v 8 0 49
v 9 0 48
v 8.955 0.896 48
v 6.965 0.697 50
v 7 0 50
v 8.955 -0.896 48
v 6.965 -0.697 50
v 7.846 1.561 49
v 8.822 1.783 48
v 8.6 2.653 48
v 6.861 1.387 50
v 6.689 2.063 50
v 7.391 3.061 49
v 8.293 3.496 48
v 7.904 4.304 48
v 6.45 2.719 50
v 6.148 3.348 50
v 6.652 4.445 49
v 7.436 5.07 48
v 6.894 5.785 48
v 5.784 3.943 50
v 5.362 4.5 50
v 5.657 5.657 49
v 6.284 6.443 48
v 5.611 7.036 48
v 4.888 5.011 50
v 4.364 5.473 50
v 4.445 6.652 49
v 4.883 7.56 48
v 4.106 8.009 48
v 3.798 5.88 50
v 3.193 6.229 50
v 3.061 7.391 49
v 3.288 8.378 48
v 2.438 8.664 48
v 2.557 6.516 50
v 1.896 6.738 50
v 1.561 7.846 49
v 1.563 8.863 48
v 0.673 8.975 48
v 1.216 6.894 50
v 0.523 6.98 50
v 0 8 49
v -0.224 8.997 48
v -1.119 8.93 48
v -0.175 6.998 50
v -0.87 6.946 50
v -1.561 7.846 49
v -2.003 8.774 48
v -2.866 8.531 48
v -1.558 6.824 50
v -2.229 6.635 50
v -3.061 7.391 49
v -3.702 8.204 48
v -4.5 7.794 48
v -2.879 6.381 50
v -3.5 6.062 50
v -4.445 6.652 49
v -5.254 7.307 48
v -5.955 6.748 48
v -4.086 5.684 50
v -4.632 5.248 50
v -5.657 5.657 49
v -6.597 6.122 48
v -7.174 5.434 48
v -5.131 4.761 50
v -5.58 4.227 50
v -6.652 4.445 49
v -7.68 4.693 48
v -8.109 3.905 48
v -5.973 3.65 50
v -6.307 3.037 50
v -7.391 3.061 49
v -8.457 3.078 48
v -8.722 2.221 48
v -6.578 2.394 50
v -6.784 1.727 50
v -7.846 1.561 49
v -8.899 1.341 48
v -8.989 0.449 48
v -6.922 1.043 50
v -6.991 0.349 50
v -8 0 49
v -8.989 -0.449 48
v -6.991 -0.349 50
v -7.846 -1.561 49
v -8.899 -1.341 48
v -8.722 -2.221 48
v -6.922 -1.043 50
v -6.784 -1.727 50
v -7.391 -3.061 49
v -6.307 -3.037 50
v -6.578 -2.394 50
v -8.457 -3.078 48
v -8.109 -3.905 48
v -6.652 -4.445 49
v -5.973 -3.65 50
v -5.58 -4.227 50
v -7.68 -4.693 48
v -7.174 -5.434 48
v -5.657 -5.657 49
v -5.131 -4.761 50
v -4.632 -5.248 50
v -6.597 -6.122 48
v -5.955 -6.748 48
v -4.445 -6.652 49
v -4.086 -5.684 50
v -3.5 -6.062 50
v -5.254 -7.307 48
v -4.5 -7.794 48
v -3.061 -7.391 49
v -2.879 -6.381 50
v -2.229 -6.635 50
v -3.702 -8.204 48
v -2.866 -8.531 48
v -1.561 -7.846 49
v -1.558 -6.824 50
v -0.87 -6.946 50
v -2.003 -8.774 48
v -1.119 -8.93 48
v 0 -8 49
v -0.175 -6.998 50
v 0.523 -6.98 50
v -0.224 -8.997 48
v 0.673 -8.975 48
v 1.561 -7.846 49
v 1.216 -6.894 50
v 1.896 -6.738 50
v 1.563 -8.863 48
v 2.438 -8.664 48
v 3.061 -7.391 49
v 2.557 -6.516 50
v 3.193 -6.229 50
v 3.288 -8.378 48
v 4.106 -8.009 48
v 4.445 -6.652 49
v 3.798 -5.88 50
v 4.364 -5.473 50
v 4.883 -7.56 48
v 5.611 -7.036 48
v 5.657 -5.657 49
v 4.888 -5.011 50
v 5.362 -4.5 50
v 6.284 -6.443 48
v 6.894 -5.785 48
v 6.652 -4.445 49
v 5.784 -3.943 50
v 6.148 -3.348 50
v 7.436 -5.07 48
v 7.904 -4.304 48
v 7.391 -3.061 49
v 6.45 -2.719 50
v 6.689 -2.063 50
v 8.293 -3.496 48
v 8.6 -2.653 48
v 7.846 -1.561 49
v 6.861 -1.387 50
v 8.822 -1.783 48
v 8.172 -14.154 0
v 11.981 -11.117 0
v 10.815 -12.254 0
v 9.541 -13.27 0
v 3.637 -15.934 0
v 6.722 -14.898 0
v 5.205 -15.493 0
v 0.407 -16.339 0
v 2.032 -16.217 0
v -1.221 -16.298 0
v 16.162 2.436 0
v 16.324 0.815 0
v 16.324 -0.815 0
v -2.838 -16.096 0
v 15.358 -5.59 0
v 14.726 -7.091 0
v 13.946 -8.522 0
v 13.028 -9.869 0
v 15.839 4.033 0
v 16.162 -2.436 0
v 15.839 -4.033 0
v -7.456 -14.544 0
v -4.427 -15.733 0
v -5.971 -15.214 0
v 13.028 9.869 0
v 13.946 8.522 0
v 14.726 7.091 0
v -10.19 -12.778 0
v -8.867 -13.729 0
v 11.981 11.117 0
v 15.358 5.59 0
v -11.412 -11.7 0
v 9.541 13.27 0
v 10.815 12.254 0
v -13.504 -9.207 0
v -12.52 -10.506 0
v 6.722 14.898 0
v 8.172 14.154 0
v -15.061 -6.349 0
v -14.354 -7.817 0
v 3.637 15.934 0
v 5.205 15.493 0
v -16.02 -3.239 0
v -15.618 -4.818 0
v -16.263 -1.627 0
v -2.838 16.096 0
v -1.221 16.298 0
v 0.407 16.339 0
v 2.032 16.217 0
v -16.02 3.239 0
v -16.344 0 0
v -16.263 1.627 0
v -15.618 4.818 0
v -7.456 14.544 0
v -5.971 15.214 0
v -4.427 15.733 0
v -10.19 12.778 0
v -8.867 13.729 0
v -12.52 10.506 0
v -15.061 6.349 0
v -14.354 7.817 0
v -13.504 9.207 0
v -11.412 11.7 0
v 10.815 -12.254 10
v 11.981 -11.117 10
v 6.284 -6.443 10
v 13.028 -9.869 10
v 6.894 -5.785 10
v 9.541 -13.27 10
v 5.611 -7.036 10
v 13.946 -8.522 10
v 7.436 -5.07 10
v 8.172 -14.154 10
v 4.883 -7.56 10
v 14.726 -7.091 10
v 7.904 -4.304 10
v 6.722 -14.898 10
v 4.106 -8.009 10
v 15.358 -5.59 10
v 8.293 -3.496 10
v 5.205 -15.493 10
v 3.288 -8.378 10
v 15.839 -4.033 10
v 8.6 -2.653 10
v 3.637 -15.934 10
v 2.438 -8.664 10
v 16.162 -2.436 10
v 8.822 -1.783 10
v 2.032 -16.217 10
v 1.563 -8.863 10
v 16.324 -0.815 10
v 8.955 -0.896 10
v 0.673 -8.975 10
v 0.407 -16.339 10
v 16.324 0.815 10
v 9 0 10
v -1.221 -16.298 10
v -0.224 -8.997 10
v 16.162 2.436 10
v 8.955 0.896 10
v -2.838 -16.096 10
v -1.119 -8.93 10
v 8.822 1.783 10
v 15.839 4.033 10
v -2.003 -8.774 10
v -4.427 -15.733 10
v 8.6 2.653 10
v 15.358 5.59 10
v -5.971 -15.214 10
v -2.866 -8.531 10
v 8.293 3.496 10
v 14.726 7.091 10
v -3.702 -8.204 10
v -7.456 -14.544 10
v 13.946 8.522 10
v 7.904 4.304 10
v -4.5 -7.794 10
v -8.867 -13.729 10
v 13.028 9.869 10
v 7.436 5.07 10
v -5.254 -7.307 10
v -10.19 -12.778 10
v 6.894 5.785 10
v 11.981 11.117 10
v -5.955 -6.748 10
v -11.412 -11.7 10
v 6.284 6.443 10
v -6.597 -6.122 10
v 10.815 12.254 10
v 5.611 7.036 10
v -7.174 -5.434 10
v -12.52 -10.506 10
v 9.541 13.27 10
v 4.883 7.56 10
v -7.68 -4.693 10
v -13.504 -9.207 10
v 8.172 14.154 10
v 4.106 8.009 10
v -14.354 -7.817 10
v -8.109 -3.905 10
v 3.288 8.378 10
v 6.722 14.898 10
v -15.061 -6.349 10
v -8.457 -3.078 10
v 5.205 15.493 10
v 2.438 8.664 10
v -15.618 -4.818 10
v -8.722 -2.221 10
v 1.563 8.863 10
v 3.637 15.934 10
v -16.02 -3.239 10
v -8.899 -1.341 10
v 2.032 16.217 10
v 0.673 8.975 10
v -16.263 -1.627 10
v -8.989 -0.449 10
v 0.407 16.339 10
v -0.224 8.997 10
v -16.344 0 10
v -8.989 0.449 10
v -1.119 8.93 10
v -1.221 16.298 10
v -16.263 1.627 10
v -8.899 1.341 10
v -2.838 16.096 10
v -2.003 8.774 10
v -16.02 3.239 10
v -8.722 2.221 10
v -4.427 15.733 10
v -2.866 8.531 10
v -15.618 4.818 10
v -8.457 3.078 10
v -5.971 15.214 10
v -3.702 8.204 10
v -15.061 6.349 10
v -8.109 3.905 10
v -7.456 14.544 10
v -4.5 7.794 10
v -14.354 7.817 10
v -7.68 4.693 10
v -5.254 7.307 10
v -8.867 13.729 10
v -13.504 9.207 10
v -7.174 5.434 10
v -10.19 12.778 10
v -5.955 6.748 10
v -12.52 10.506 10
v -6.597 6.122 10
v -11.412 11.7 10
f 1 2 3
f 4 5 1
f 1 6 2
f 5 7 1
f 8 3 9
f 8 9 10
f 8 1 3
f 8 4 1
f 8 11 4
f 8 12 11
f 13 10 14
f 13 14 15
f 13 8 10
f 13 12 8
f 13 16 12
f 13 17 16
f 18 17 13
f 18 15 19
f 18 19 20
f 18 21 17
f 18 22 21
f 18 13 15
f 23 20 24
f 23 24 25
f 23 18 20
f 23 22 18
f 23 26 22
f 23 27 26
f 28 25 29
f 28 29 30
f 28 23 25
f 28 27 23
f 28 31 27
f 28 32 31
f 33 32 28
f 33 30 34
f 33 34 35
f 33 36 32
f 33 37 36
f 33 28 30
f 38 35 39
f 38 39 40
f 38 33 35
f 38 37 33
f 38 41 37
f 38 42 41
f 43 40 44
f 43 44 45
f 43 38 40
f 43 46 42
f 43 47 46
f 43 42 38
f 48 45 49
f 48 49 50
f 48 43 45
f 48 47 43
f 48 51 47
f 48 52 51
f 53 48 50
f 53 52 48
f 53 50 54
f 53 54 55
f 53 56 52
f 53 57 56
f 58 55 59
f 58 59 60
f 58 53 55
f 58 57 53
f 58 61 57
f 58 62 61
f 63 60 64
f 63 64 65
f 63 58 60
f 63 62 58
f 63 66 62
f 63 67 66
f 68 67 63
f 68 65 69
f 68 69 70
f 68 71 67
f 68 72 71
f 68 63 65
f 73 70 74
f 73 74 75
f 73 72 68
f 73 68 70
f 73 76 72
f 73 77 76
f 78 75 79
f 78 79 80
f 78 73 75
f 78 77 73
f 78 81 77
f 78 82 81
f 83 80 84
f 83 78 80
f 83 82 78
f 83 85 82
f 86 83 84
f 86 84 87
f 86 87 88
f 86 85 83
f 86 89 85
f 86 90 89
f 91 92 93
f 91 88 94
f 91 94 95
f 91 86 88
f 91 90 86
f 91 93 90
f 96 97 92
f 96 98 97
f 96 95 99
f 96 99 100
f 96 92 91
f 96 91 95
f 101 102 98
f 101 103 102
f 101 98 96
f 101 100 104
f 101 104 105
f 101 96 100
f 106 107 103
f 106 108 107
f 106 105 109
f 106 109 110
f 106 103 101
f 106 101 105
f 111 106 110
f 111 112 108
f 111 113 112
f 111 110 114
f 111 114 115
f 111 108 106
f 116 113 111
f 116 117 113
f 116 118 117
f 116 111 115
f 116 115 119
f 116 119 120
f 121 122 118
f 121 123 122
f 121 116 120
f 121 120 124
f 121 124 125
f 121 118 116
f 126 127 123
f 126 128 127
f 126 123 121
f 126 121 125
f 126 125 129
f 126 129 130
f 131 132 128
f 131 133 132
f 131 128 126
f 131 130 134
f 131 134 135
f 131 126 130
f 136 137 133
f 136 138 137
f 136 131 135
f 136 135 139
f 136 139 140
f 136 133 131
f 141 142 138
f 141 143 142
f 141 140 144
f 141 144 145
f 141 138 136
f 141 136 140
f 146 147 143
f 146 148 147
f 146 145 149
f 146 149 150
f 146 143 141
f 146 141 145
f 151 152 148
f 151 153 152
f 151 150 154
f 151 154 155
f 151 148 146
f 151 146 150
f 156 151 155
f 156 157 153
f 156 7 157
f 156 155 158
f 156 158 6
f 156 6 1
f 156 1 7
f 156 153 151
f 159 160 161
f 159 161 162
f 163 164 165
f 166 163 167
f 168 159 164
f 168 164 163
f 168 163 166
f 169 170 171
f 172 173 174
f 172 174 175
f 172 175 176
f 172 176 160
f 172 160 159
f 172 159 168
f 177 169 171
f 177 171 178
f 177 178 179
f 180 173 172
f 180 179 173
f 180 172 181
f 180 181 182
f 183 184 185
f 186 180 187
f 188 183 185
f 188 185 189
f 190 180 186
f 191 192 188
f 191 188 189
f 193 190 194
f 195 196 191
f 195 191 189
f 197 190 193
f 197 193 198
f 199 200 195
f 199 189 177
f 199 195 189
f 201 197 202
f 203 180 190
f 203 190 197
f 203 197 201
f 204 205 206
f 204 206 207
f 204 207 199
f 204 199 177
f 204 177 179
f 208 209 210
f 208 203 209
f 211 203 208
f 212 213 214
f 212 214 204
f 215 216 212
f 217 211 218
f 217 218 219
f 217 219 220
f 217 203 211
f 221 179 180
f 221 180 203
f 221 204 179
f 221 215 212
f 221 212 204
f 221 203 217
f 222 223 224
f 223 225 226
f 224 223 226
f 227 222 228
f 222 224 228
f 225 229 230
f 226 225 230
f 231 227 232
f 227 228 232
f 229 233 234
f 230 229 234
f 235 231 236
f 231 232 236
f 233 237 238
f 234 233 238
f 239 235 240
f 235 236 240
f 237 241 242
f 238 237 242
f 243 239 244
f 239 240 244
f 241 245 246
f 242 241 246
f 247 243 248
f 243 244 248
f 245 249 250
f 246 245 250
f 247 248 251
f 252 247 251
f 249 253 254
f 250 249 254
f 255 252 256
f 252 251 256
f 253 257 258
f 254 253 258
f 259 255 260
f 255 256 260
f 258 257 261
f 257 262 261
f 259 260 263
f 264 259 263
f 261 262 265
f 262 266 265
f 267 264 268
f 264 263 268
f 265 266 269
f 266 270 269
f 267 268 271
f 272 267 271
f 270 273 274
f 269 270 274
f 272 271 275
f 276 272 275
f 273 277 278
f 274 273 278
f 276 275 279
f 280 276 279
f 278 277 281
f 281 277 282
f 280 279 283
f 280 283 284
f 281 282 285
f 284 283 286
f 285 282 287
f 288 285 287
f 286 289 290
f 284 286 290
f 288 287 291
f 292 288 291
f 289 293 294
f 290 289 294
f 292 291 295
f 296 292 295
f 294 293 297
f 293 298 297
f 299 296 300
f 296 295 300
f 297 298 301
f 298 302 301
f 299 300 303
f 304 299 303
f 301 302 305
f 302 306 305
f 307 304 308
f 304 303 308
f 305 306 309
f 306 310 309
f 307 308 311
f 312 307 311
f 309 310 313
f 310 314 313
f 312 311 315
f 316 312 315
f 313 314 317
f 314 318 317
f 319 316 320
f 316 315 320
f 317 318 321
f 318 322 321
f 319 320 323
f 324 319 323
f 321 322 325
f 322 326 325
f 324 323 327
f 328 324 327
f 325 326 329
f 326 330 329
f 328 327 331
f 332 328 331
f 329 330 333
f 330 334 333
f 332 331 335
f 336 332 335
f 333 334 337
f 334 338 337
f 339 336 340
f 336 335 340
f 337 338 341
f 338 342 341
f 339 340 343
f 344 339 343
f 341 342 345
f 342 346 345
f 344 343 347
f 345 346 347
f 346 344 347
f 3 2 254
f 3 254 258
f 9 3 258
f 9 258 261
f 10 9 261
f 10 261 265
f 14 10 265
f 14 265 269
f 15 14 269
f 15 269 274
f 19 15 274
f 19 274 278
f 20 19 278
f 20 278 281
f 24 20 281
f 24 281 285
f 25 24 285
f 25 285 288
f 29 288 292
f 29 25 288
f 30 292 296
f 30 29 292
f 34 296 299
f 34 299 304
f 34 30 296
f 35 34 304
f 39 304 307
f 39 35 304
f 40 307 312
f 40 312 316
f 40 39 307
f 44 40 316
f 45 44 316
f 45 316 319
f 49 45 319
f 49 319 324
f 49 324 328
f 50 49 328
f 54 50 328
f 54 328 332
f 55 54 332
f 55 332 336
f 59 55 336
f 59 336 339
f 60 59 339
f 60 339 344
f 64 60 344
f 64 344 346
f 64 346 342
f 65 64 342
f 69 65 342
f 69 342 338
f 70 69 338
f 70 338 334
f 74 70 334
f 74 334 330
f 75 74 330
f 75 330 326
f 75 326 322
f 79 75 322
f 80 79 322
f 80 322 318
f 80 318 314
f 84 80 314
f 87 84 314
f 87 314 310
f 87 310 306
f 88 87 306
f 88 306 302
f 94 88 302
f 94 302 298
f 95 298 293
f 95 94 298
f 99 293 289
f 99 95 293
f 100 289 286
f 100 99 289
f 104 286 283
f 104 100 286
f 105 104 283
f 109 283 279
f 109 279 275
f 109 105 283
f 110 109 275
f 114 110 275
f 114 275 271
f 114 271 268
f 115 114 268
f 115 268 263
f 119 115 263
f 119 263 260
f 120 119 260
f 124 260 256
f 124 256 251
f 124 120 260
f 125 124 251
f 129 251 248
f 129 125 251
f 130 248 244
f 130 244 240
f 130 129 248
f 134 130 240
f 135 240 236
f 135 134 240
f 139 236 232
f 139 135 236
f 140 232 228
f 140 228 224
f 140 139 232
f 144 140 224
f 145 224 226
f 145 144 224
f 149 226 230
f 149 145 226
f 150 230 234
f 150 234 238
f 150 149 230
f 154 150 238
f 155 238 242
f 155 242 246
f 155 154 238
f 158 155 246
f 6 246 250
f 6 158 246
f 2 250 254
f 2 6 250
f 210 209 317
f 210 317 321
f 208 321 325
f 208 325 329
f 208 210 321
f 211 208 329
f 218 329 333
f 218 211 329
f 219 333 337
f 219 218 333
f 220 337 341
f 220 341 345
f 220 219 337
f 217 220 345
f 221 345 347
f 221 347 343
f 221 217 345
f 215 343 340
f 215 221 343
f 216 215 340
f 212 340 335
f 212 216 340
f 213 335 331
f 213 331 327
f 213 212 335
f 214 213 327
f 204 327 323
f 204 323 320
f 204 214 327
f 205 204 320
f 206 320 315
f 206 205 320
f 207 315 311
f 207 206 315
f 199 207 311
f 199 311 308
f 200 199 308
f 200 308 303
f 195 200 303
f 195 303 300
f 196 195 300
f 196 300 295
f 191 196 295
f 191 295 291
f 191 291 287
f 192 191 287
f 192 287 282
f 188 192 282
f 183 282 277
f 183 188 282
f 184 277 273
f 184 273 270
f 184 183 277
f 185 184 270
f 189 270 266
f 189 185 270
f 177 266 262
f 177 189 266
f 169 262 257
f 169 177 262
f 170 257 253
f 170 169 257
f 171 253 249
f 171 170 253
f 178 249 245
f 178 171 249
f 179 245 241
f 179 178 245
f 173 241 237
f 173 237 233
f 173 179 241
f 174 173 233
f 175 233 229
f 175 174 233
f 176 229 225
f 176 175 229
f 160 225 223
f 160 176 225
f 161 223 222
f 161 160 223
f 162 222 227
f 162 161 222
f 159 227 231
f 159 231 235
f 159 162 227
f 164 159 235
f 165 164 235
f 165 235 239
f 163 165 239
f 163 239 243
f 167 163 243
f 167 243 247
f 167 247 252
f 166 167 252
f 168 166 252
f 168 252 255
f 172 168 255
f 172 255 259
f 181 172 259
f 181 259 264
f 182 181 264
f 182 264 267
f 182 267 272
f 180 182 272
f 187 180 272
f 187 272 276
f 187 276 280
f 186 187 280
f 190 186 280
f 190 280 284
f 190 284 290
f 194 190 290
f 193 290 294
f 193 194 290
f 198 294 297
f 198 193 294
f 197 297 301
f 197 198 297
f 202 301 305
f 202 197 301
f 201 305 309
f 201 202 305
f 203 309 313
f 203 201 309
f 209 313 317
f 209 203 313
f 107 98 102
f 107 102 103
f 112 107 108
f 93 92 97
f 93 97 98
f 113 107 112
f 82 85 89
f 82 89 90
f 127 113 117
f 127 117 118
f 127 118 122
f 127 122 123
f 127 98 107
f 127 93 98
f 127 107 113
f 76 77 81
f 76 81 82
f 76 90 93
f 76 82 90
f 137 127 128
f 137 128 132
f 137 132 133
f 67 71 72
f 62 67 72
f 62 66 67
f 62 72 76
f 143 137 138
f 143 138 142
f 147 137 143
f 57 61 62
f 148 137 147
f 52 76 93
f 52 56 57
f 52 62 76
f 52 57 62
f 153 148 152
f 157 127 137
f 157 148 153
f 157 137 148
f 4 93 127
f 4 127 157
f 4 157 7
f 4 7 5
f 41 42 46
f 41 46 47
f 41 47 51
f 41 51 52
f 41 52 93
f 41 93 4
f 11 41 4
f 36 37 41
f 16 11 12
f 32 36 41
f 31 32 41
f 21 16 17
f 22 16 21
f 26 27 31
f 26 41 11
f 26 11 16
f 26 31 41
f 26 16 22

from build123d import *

# Parameters (mm, degrees)
SKETCH1_R           = 10
BOSS_EXTRUDE1_DEPTH = 50
SKETCH2_R           = 16.344073083
BOSS_EXTRUDE2_DEPTH = 10
CHAMFER1_SIZE       = 3
SKETCH3_OUTSIDE_W   = 48.308
SKETCH3_OUTSIDE_H   = 48.308
SKETCH3_OUTSIDE_R   = 9
CUT_EXTRUDE1_DEPTH  = 40


with BuildPart() as part:
    # Sketch1 → Boss-Extrude1 (new body)
    with BuildSketch(Plane.XY):
        Circle(SKETCH1_R)
    extrude(amount=BOSS_EXTRUDE1_DEPTH)

    # Sketch2 → Boss-Extrude2 (add)
    with BuildSketch(Plane(origin=(0, 0, 0), x_dir=(-1, 0, 0), z_dir=(0, 0, -1))):
        Circle(SKETCH2_R)
    extrude(amount=-BOSS_EXTRUDE2_DEPTH)

    # Chamfer1
    chamfer1_edges = [part.edges().sort_by_distance(p)[0] for p in [
        (-10, 0, 50),
    ]]
    chamfer(chamfer1_edges, length=CHAMFER1_SIZE)

    # Sketch3 outside → Cut-Extrude1 (cut)
    with BuildSketch(Plane.XY.offset(50)):
        Rectangle(SKETCH3_OUTSIDE_W, SKETCH3_OUTSIDE_H)
        Circle(SKETCH3_OUTSIDE_R, mode=Mode.SUBTRACT)
    extrude(amount=-CUT_EXTRUDE1_DEPTH, mode=Mode.SUBTRACT)


solid = part.part
